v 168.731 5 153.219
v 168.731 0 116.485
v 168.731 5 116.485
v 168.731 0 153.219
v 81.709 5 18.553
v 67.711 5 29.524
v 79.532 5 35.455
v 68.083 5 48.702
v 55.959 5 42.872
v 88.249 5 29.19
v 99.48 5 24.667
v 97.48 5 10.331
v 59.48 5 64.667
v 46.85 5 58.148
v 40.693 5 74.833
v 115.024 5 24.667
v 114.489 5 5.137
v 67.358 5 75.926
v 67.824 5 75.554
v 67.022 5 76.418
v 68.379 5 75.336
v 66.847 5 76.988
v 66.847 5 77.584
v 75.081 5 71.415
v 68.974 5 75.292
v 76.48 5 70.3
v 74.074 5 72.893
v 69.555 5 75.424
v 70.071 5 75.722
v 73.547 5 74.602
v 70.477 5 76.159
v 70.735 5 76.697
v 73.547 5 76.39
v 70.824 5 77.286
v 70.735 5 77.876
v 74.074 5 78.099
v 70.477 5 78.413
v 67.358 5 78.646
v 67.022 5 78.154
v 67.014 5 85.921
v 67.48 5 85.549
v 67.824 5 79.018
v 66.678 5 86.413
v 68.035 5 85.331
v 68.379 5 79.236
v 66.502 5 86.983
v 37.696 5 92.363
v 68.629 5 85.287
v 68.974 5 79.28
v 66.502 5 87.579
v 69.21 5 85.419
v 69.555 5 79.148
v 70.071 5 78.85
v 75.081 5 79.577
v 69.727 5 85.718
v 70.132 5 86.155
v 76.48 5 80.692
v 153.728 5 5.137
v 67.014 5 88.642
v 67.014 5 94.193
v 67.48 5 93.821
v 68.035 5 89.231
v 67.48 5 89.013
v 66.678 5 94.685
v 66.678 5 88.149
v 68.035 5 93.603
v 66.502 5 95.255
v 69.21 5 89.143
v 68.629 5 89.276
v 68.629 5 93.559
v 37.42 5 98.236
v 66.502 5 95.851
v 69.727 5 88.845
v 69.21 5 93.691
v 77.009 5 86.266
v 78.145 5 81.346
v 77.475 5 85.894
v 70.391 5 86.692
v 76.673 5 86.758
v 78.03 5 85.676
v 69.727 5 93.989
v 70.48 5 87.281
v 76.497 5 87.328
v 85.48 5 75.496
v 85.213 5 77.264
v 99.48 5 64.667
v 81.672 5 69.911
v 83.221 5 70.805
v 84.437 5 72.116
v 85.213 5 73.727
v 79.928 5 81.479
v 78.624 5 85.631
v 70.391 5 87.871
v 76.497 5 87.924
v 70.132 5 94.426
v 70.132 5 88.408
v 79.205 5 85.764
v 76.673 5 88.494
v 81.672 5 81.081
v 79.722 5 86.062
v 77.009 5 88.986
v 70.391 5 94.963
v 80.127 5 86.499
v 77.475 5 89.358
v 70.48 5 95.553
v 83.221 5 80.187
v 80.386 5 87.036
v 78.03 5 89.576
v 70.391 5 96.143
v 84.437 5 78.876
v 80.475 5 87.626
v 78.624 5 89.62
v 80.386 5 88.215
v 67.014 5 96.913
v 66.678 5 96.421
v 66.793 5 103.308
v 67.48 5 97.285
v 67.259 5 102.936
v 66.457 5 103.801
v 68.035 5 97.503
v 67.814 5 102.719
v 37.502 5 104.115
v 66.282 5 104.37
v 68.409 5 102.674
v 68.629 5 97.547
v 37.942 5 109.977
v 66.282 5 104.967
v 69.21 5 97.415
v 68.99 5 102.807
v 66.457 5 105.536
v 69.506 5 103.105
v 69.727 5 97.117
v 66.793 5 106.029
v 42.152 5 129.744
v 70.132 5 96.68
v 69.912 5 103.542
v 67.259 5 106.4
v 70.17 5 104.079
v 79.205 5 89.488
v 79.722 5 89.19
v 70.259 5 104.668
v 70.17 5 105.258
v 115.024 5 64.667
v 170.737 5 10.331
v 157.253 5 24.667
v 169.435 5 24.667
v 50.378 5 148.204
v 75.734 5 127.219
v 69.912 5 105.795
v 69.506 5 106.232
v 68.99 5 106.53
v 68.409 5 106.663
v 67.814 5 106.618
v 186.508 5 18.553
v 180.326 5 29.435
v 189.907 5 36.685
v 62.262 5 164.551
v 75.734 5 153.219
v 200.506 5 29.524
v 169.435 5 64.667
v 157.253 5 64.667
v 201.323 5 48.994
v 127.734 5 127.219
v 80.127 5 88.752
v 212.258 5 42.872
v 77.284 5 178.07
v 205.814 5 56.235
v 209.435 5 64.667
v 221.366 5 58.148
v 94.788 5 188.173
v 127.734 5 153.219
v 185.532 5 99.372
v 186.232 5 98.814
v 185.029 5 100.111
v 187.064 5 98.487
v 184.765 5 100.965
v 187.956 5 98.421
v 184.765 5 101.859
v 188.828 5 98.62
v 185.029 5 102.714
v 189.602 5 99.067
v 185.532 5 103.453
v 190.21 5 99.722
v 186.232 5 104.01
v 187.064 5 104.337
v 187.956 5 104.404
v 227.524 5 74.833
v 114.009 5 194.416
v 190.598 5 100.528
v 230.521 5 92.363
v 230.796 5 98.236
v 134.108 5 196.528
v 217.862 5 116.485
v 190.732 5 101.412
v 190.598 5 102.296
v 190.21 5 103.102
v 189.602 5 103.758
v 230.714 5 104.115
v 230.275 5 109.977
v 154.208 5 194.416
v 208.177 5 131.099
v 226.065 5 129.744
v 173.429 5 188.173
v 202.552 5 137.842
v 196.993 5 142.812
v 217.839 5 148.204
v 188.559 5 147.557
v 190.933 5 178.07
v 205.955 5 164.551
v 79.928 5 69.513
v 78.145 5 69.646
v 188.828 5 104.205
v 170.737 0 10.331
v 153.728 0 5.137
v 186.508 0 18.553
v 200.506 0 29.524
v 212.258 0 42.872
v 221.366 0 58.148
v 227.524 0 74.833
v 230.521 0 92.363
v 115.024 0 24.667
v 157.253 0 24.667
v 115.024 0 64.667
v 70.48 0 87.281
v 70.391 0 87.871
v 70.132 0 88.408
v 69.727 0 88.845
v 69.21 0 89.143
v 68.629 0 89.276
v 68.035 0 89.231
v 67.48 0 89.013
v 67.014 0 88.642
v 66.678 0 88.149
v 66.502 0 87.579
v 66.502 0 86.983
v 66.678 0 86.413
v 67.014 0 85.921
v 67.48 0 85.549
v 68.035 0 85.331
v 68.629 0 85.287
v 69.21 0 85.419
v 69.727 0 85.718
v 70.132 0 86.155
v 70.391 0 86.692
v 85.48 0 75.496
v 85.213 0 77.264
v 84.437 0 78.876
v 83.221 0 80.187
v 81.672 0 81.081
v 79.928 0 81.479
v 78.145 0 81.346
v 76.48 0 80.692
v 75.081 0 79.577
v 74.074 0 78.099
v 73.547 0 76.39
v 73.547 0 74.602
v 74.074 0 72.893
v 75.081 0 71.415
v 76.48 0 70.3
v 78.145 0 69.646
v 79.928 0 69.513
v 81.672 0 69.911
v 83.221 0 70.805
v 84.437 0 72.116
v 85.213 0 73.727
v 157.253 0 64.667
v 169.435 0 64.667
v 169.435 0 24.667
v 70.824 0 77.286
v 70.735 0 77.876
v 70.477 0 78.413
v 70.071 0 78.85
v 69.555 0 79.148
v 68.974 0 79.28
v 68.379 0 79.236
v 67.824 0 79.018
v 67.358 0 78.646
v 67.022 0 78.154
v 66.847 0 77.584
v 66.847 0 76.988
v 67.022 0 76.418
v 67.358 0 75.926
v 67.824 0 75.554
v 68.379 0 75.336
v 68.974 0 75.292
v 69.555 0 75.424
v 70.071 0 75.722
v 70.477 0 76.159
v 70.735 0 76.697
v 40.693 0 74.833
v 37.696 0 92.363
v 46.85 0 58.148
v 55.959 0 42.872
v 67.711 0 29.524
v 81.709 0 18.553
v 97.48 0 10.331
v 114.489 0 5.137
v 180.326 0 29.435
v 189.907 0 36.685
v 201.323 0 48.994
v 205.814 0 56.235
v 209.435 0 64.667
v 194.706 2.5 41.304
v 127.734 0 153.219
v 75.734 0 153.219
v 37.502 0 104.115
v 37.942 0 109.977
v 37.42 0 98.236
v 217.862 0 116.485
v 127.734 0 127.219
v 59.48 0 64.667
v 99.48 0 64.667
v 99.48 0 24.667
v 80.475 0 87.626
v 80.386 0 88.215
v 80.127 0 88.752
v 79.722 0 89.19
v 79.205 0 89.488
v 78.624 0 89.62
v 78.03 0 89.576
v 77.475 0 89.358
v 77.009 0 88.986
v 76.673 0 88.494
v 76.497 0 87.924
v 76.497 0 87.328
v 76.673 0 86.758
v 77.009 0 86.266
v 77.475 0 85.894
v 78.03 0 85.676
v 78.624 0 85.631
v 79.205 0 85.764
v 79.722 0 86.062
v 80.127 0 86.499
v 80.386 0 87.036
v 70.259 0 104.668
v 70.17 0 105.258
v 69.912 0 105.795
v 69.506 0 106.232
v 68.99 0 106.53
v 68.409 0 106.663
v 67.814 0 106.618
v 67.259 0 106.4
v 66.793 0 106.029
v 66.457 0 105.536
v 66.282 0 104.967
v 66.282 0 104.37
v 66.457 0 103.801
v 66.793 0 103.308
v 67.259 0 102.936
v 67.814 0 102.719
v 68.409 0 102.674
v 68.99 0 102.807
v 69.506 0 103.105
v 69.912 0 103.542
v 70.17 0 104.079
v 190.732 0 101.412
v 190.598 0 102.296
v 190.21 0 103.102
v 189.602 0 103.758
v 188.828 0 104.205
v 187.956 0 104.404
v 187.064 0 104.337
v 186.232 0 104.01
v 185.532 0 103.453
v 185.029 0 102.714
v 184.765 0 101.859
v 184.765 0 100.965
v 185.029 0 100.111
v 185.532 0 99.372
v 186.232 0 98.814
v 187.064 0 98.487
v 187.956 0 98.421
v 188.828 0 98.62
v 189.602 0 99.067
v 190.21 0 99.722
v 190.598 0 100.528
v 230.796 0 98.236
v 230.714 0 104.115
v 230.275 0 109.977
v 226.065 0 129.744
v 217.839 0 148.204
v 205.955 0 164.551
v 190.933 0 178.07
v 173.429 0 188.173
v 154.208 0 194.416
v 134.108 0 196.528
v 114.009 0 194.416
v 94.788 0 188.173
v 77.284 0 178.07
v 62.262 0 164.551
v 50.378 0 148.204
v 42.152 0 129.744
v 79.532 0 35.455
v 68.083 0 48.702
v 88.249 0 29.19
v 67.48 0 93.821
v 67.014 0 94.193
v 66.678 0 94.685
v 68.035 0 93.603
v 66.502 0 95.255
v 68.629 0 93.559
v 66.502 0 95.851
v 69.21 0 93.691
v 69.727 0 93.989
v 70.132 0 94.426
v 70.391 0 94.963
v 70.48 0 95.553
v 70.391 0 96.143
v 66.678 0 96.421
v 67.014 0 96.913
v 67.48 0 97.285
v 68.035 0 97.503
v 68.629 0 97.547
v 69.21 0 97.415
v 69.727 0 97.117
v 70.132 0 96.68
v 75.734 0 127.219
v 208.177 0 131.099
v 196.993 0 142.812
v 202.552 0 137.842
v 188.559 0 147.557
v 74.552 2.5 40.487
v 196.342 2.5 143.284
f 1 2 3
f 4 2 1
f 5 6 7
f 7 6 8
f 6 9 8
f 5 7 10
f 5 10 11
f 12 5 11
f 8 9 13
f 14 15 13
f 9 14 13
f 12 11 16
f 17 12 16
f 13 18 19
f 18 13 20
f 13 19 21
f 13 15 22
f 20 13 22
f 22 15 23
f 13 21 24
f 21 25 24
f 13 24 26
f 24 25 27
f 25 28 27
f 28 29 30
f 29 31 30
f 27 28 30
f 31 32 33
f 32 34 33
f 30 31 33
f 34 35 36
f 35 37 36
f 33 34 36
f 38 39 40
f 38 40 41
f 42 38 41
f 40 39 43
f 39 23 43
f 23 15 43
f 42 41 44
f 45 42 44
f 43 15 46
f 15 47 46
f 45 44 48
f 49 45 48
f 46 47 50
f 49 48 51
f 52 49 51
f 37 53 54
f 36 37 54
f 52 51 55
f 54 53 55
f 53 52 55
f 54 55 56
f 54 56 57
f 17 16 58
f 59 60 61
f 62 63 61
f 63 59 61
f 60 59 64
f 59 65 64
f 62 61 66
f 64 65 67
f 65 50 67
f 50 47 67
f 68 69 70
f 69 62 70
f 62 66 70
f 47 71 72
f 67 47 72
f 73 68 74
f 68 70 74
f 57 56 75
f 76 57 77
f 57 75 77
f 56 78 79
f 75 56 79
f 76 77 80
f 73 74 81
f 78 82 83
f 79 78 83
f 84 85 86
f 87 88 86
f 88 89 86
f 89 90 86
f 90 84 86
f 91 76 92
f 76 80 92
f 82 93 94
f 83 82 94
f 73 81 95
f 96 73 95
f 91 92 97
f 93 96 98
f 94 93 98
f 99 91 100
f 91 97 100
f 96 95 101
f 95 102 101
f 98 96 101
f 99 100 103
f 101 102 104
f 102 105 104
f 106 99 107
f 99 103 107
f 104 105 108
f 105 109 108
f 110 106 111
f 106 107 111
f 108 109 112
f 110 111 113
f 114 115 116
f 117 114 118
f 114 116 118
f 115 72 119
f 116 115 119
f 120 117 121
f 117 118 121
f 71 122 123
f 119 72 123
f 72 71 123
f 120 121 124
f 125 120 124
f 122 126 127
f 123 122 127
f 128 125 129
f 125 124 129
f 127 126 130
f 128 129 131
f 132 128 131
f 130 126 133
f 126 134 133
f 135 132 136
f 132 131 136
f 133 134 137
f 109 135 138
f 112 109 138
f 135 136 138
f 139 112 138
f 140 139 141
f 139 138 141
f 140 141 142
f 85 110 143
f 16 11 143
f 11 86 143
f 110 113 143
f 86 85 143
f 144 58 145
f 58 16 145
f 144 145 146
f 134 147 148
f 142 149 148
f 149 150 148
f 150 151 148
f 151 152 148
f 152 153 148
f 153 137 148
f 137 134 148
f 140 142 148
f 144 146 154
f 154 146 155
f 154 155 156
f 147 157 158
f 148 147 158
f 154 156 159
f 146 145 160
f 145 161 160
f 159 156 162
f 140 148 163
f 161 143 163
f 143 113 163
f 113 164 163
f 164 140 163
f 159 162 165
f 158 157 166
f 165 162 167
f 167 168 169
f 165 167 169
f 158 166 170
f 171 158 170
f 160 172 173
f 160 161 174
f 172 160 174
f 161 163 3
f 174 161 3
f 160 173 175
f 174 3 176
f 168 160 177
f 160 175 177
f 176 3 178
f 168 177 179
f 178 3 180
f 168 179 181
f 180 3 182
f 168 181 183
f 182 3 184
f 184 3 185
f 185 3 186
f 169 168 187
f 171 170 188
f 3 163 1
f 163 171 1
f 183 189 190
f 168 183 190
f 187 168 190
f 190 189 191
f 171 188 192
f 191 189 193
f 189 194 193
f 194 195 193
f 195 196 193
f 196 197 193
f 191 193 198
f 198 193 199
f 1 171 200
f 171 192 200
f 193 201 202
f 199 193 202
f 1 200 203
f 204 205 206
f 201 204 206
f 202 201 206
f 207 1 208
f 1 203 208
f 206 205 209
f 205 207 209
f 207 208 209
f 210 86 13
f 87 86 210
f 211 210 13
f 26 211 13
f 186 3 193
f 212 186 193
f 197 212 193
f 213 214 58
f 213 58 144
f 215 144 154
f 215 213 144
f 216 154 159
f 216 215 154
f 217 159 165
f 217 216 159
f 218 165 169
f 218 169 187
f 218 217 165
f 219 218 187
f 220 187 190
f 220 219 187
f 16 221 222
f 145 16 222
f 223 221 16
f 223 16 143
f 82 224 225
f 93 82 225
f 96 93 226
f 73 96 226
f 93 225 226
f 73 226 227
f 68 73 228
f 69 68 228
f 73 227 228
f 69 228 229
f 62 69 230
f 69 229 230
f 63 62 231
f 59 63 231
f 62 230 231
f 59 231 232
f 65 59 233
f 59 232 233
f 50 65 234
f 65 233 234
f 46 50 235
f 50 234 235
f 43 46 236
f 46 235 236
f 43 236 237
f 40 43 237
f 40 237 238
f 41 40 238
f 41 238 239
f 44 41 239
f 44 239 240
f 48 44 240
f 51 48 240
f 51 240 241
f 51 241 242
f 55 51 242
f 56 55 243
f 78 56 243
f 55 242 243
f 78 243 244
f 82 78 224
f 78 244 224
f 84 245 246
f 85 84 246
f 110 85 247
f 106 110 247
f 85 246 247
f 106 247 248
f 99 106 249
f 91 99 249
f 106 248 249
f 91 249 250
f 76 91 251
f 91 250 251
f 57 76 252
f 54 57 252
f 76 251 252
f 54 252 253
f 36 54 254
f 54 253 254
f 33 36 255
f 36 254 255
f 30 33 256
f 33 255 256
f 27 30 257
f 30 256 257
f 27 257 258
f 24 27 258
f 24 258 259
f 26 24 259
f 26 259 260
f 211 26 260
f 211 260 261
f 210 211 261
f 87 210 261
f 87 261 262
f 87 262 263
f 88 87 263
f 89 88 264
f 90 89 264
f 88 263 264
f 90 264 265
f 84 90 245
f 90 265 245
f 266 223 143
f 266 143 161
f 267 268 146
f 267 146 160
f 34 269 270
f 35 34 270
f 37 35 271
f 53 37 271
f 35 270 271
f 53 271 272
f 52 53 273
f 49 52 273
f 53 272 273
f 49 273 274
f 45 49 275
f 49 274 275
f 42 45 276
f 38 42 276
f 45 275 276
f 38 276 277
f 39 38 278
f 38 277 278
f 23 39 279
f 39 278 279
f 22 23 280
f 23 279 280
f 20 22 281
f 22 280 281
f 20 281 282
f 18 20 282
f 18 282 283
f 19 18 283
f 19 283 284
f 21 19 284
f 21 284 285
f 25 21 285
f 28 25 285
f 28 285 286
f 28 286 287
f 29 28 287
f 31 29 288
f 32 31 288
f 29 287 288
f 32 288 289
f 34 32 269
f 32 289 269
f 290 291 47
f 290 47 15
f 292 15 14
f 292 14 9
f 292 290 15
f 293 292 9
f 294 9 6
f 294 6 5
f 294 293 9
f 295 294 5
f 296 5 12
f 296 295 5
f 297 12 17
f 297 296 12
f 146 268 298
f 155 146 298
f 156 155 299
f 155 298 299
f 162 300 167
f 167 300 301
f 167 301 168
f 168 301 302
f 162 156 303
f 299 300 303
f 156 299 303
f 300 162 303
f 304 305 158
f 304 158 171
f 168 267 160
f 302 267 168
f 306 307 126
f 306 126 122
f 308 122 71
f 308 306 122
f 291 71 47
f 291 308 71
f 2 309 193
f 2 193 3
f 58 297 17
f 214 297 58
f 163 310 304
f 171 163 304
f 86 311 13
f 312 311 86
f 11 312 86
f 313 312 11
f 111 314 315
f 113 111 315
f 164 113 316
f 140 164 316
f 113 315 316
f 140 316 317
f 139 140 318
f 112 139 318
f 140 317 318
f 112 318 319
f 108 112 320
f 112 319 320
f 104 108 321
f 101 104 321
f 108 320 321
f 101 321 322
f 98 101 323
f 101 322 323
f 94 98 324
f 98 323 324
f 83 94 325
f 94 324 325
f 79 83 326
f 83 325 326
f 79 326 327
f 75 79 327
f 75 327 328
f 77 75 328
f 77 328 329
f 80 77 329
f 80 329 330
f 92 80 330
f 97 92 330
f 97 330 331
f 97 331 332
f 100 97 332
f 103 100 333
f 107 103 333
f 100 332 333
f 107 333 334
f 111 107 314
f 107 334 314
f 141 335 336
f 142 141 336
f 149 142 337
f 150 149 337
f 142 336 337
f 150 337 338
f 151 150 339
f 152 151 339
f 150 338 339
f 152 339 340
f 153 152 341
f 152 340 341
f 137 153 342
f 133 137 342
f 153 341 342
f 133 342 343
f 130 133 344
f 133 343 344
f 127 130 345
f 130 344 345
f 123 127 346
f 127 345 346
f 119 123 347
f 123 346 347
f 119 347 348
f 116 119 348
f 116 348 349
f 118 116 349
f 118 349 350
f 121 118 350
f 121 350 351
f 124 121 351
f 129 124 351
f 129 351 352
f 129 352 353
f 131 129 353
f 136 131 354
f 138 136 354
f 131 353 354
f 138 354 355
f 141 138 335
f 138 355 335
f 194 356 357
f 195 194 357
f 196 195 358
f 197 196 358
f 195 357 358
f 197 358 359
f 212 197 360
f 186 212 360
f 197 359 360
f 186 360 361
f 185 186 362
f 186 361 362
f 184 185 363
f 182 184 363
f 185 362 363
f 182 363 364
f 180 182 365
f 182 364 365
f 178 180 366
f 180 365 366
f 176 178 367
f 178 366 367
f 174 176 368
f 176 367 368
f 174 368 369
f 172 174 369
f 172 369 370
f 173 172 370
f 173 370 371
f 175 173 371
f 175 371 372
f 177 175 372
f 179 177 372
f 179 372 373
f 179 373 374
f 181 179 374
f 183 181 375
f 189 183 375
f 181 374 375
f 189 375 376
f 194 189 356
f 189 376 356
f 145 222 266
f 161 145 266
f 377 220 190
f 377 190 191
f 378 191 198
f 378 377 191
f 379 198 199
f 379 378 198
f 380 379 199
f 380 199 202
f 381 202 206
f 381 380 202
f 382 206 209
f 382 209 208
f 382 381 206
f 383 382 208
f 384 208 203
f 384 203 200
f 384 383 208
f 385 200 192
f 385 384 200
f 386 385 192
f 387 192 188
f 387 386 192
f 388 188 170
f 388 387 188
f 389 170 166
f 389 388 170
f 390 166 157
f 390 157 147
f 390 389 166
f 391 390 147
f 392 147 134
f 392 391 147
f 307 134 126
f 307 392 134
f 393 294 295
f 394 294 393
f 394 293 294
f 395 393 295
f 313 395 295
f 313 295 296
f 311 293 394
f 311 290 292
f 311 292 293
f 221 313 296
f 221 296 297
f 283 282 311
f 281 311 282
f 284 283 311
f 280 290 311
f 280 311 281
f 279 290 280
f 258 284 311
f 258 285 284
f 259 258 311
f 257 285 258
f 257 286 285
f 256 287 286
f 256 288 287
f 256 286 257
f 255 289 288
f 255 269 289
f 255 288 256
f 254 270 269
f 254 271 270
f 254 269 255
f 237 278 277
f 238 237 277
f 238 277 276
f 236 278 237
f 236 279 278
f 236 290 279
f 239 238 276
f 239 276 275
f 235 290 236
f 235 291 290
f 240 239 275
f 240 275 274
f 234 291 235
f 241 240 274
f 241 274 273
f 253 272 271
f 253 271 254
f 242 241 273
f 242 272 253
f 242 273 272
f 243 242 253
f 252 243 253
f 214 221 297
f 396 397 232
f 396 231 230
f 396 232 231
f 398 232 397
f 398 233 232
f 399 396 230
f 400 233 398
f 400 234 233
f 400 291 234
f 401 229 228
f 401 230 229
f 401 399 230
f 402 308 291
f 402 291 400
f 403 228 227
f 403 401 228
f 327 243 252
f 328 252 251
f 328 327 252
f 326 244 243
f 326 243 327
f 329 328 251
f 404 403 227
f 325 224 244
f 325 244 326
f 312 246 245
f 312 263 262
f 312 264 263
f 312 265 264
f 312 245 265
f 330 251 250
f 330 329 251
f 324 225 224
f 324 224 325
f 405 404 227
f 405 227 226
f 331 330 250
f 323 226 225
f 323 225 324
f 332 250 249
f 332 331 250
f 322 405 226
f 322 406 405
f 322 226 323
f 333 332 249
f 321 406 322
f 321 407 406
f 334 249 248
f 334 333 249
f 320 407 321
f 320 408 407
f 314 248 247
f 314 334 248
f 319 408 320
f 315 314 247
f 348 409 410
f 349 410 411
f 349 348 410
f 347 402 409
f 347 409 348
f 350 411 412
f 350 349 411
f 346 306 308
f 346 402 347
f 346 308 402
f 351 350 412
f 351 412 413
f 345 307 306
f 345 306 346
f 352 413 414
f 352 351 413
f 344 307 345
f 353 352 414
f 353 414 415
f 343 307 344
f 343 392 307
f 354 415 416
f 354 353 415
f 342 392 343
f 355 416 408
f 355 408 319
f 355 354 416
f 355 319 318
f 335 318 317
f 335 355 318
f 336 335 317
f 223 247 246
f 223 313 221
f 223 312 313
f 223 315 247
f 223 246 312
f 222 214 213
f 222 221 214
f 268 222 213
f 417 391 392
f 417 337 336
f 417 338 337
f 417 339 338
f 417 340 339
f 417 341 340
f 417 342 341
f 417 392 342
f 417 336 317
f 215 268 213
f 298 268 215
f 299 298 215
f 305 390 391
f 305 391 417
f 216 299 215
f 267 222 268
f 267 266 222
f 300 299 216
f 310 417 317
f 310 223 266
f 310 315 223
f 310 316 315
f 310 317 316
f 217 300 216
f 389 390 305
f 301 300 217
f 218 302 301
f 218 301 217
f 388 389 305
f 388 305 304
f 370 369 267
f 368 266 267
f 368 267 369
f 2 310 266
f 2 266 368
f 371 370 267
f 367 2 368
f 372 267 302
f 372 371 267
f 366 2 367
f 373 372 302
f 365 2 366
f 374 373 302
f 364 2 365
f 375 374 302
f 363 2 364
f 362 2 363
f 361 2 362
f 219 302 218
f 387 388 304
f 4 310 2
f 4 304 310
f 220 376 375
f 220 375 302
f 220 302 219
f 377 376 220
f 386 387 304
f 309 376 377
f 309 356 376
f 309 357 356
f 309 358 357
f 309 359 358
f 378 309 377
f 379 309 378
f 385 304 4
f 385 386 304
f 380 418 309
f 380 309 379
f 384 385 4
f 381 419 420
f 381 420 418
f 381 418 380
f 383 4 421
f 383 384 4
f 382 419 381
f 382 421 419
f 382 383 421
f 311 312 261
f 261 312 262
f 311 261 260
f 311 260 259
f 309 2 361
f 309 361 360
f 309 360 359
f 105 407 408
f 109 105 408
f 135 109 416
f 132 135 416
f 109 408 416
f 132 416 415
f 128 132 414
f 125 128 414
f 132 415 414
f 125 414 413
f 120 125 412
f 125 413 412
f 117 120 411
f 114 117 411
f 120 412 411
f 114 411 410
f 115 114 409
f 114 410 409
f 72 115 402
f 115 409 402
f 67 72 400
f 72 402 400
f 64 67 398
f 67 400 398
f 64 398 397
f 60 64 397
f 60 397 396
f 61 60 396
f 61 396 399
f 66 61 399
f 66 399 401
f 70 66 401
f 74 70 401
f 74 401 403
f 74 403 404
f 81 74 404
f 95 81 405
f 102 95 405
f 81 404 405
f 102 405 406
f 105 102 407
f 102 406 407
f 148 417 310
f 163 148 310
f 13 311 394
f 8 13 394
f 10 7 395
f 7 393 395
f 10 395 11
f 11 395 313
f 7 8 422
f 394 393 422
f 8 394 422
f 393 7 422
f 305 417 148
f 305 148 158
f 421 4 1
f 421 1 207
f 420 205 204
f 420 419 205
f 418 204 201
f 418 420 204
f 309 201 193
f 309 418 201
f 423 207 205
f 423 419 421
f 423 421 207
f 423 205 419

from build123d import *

# Parameters (mm, degrees)
F0_R     = 6
F0_R_2   = 2
F0_W     = 42.228937149
F0_H     = 40
F0_R_3   = 3
F0_W_2   = 52
F0_H_2   = 26
F1_DEPTH = 5


# Not quite as in the source:
# - the program builds the solid bodies; features that only make, move or delete a surface that nothing else refers to are left out


with BuildPart() as f1:
    # F0 (on Front) → F1 (new body)
    with BuildSketch(Plane.XZ):
        with BuildLine():
            Line((114.488999566, 5.1368772984), (153.7277594005, 5.1368772984))
            ThreePointArc((153.7277594005, 5.1368772984), (206.6891166454, 35.9273670532), (230.521004176, 92.3631780006))
            Line((230.521004176, 92.3631780006), (37.6957547904, 92.3631780006))
            ThreePointArc((37.6957547904, 92.3631780006), (61.527642321, 35.9273670532), (114.488999566, 5.1368772984))
        make_face()
        with BuildLine():
            add(Edge.make_bspline(
                [(59.4798011976, 64.6672644662), (63.1085559726, 55.6081011891), (73.7513924788, 39.0135130084), (88.0385711789, 27.8172641993), (99.4798011976, 24.6672644662)],
                knots=[0, 0, 0, 0, 0.4955592973, 1, 1, 1, 1], degree=3))
            Line((59.4798011976, 64.6672644662), (99.4798011976, 64.6672644662))
            Line((99.4798011976, 64.6672644662), (99.4798011976, 24.6672644662))
        make_face(mode=Mode.SUBTRACT)
        with Locations((79.4798011976, 75.4959482996)):
            Circle(F0_R, mode=Mode.SUBTRACT)
        with Locations((68.8243359327, 77.2860795259)):
            Circle(F0_R_2, mode=Mode.SUBTRACT)
        with Locations((68.4796720743, 87.2811824083)):
            Circle(F0_R_2, mode=Mode.SUBTRACT)
        with Locations((78.4747824073, 87.6258462667)):
            Circle(F0_R_2, mode=Mode.SUBTRACT)
        with Locations((136.1386179924, 44.6672644662)):
            Rectangle(F0_W, F0_H, mode=Mode.SUBTRACT)
        with BuildLine():
            Line((169.434517622, 64.6672644662), (209.434517622, 64.6672644662))
            add(Edge.make_bspline(
                [(169.434517622, 24.6672644662), (179.2577588513, 27.1916796699), (196.3345264834, 41.3050241265), (205.696706141, 54.1838165912), (209.434517622, 64.6672644662)],
                knots=[0, 0, 0, 0, 0.5114020852, 1, 1, 1, 1], degree=3))
            Line((169.434517622, 24.6672644662), (169.434517622, 64.6672644662))
        make_face(mode=Mode.SUBTRACT)
        with BuildLine():
            Line((37.6957547904, 92.3631780006), (230.521004176, 92.3631780006))
            ThreePointArc((230.521004176, 92.3631780006), (230.8000531475, 101.1758471342), (230.2752492915, 109.9773007924))
            Line((230.2752492915, 109.9773007924), (37.941509675, 109.9773007924))
            ThreePointArc((37.941509675, 109.9773007924), (37.4167058189, 101.1758471342), (37.6957547904, 92.3631780006))
        make_face()
        with Locations((68.4796720743, 95.552995801)):
            Circle(F0_R_2, mode=Mode.SUBTRACT)
        with Locations((68.259306113, 104.66844666)):
            Circle(F0_R_2, mode=Mode.SUBTRACT)
        with Locations((187.7316534519, 101.4121994376)):
            Circle(F0_R_3, mode=Mode.SUBTRACT)
        with BuildLine():
            Line((37.941509675, 109.9773007924), (230.2752492915, 109.9773007924))
            ThreePointArc((230.2752492915, 109.9773007924), (134.1083794832, 196.5278747198), (37.941509675, 109.9773007924))
        make_face()
        with Locations((101.7344622612, 140.218708396)):
            Rectangle(F0_W_2, F0_H_2, mode=Mode.SUBTRACT)
        with BuildLine():
            Line((168.7307208776, 116.4853125811), (168.7307208776, 153.218708396))
            add(Edge.make_bspline(
                [(168.7307208776, 153.218708396), (178.5376432275, 150.9342291161), (199.0201954085, 146.7686018938), (211.3988850452, 126.7827873103), (217.8624719381, 116.4853125811)],
                knots=[0, 0, 0, 0, 0.4802466092, 1, 1, 1, 1], degree=3))
            Line((217.8624719381, 116.4853125811), (168.7307208776, 116.4853125811))
        make_face(mode=Mode.SUBTRACT)
    extrude(amount=-F1_DEPTH)


solid = f1.part
